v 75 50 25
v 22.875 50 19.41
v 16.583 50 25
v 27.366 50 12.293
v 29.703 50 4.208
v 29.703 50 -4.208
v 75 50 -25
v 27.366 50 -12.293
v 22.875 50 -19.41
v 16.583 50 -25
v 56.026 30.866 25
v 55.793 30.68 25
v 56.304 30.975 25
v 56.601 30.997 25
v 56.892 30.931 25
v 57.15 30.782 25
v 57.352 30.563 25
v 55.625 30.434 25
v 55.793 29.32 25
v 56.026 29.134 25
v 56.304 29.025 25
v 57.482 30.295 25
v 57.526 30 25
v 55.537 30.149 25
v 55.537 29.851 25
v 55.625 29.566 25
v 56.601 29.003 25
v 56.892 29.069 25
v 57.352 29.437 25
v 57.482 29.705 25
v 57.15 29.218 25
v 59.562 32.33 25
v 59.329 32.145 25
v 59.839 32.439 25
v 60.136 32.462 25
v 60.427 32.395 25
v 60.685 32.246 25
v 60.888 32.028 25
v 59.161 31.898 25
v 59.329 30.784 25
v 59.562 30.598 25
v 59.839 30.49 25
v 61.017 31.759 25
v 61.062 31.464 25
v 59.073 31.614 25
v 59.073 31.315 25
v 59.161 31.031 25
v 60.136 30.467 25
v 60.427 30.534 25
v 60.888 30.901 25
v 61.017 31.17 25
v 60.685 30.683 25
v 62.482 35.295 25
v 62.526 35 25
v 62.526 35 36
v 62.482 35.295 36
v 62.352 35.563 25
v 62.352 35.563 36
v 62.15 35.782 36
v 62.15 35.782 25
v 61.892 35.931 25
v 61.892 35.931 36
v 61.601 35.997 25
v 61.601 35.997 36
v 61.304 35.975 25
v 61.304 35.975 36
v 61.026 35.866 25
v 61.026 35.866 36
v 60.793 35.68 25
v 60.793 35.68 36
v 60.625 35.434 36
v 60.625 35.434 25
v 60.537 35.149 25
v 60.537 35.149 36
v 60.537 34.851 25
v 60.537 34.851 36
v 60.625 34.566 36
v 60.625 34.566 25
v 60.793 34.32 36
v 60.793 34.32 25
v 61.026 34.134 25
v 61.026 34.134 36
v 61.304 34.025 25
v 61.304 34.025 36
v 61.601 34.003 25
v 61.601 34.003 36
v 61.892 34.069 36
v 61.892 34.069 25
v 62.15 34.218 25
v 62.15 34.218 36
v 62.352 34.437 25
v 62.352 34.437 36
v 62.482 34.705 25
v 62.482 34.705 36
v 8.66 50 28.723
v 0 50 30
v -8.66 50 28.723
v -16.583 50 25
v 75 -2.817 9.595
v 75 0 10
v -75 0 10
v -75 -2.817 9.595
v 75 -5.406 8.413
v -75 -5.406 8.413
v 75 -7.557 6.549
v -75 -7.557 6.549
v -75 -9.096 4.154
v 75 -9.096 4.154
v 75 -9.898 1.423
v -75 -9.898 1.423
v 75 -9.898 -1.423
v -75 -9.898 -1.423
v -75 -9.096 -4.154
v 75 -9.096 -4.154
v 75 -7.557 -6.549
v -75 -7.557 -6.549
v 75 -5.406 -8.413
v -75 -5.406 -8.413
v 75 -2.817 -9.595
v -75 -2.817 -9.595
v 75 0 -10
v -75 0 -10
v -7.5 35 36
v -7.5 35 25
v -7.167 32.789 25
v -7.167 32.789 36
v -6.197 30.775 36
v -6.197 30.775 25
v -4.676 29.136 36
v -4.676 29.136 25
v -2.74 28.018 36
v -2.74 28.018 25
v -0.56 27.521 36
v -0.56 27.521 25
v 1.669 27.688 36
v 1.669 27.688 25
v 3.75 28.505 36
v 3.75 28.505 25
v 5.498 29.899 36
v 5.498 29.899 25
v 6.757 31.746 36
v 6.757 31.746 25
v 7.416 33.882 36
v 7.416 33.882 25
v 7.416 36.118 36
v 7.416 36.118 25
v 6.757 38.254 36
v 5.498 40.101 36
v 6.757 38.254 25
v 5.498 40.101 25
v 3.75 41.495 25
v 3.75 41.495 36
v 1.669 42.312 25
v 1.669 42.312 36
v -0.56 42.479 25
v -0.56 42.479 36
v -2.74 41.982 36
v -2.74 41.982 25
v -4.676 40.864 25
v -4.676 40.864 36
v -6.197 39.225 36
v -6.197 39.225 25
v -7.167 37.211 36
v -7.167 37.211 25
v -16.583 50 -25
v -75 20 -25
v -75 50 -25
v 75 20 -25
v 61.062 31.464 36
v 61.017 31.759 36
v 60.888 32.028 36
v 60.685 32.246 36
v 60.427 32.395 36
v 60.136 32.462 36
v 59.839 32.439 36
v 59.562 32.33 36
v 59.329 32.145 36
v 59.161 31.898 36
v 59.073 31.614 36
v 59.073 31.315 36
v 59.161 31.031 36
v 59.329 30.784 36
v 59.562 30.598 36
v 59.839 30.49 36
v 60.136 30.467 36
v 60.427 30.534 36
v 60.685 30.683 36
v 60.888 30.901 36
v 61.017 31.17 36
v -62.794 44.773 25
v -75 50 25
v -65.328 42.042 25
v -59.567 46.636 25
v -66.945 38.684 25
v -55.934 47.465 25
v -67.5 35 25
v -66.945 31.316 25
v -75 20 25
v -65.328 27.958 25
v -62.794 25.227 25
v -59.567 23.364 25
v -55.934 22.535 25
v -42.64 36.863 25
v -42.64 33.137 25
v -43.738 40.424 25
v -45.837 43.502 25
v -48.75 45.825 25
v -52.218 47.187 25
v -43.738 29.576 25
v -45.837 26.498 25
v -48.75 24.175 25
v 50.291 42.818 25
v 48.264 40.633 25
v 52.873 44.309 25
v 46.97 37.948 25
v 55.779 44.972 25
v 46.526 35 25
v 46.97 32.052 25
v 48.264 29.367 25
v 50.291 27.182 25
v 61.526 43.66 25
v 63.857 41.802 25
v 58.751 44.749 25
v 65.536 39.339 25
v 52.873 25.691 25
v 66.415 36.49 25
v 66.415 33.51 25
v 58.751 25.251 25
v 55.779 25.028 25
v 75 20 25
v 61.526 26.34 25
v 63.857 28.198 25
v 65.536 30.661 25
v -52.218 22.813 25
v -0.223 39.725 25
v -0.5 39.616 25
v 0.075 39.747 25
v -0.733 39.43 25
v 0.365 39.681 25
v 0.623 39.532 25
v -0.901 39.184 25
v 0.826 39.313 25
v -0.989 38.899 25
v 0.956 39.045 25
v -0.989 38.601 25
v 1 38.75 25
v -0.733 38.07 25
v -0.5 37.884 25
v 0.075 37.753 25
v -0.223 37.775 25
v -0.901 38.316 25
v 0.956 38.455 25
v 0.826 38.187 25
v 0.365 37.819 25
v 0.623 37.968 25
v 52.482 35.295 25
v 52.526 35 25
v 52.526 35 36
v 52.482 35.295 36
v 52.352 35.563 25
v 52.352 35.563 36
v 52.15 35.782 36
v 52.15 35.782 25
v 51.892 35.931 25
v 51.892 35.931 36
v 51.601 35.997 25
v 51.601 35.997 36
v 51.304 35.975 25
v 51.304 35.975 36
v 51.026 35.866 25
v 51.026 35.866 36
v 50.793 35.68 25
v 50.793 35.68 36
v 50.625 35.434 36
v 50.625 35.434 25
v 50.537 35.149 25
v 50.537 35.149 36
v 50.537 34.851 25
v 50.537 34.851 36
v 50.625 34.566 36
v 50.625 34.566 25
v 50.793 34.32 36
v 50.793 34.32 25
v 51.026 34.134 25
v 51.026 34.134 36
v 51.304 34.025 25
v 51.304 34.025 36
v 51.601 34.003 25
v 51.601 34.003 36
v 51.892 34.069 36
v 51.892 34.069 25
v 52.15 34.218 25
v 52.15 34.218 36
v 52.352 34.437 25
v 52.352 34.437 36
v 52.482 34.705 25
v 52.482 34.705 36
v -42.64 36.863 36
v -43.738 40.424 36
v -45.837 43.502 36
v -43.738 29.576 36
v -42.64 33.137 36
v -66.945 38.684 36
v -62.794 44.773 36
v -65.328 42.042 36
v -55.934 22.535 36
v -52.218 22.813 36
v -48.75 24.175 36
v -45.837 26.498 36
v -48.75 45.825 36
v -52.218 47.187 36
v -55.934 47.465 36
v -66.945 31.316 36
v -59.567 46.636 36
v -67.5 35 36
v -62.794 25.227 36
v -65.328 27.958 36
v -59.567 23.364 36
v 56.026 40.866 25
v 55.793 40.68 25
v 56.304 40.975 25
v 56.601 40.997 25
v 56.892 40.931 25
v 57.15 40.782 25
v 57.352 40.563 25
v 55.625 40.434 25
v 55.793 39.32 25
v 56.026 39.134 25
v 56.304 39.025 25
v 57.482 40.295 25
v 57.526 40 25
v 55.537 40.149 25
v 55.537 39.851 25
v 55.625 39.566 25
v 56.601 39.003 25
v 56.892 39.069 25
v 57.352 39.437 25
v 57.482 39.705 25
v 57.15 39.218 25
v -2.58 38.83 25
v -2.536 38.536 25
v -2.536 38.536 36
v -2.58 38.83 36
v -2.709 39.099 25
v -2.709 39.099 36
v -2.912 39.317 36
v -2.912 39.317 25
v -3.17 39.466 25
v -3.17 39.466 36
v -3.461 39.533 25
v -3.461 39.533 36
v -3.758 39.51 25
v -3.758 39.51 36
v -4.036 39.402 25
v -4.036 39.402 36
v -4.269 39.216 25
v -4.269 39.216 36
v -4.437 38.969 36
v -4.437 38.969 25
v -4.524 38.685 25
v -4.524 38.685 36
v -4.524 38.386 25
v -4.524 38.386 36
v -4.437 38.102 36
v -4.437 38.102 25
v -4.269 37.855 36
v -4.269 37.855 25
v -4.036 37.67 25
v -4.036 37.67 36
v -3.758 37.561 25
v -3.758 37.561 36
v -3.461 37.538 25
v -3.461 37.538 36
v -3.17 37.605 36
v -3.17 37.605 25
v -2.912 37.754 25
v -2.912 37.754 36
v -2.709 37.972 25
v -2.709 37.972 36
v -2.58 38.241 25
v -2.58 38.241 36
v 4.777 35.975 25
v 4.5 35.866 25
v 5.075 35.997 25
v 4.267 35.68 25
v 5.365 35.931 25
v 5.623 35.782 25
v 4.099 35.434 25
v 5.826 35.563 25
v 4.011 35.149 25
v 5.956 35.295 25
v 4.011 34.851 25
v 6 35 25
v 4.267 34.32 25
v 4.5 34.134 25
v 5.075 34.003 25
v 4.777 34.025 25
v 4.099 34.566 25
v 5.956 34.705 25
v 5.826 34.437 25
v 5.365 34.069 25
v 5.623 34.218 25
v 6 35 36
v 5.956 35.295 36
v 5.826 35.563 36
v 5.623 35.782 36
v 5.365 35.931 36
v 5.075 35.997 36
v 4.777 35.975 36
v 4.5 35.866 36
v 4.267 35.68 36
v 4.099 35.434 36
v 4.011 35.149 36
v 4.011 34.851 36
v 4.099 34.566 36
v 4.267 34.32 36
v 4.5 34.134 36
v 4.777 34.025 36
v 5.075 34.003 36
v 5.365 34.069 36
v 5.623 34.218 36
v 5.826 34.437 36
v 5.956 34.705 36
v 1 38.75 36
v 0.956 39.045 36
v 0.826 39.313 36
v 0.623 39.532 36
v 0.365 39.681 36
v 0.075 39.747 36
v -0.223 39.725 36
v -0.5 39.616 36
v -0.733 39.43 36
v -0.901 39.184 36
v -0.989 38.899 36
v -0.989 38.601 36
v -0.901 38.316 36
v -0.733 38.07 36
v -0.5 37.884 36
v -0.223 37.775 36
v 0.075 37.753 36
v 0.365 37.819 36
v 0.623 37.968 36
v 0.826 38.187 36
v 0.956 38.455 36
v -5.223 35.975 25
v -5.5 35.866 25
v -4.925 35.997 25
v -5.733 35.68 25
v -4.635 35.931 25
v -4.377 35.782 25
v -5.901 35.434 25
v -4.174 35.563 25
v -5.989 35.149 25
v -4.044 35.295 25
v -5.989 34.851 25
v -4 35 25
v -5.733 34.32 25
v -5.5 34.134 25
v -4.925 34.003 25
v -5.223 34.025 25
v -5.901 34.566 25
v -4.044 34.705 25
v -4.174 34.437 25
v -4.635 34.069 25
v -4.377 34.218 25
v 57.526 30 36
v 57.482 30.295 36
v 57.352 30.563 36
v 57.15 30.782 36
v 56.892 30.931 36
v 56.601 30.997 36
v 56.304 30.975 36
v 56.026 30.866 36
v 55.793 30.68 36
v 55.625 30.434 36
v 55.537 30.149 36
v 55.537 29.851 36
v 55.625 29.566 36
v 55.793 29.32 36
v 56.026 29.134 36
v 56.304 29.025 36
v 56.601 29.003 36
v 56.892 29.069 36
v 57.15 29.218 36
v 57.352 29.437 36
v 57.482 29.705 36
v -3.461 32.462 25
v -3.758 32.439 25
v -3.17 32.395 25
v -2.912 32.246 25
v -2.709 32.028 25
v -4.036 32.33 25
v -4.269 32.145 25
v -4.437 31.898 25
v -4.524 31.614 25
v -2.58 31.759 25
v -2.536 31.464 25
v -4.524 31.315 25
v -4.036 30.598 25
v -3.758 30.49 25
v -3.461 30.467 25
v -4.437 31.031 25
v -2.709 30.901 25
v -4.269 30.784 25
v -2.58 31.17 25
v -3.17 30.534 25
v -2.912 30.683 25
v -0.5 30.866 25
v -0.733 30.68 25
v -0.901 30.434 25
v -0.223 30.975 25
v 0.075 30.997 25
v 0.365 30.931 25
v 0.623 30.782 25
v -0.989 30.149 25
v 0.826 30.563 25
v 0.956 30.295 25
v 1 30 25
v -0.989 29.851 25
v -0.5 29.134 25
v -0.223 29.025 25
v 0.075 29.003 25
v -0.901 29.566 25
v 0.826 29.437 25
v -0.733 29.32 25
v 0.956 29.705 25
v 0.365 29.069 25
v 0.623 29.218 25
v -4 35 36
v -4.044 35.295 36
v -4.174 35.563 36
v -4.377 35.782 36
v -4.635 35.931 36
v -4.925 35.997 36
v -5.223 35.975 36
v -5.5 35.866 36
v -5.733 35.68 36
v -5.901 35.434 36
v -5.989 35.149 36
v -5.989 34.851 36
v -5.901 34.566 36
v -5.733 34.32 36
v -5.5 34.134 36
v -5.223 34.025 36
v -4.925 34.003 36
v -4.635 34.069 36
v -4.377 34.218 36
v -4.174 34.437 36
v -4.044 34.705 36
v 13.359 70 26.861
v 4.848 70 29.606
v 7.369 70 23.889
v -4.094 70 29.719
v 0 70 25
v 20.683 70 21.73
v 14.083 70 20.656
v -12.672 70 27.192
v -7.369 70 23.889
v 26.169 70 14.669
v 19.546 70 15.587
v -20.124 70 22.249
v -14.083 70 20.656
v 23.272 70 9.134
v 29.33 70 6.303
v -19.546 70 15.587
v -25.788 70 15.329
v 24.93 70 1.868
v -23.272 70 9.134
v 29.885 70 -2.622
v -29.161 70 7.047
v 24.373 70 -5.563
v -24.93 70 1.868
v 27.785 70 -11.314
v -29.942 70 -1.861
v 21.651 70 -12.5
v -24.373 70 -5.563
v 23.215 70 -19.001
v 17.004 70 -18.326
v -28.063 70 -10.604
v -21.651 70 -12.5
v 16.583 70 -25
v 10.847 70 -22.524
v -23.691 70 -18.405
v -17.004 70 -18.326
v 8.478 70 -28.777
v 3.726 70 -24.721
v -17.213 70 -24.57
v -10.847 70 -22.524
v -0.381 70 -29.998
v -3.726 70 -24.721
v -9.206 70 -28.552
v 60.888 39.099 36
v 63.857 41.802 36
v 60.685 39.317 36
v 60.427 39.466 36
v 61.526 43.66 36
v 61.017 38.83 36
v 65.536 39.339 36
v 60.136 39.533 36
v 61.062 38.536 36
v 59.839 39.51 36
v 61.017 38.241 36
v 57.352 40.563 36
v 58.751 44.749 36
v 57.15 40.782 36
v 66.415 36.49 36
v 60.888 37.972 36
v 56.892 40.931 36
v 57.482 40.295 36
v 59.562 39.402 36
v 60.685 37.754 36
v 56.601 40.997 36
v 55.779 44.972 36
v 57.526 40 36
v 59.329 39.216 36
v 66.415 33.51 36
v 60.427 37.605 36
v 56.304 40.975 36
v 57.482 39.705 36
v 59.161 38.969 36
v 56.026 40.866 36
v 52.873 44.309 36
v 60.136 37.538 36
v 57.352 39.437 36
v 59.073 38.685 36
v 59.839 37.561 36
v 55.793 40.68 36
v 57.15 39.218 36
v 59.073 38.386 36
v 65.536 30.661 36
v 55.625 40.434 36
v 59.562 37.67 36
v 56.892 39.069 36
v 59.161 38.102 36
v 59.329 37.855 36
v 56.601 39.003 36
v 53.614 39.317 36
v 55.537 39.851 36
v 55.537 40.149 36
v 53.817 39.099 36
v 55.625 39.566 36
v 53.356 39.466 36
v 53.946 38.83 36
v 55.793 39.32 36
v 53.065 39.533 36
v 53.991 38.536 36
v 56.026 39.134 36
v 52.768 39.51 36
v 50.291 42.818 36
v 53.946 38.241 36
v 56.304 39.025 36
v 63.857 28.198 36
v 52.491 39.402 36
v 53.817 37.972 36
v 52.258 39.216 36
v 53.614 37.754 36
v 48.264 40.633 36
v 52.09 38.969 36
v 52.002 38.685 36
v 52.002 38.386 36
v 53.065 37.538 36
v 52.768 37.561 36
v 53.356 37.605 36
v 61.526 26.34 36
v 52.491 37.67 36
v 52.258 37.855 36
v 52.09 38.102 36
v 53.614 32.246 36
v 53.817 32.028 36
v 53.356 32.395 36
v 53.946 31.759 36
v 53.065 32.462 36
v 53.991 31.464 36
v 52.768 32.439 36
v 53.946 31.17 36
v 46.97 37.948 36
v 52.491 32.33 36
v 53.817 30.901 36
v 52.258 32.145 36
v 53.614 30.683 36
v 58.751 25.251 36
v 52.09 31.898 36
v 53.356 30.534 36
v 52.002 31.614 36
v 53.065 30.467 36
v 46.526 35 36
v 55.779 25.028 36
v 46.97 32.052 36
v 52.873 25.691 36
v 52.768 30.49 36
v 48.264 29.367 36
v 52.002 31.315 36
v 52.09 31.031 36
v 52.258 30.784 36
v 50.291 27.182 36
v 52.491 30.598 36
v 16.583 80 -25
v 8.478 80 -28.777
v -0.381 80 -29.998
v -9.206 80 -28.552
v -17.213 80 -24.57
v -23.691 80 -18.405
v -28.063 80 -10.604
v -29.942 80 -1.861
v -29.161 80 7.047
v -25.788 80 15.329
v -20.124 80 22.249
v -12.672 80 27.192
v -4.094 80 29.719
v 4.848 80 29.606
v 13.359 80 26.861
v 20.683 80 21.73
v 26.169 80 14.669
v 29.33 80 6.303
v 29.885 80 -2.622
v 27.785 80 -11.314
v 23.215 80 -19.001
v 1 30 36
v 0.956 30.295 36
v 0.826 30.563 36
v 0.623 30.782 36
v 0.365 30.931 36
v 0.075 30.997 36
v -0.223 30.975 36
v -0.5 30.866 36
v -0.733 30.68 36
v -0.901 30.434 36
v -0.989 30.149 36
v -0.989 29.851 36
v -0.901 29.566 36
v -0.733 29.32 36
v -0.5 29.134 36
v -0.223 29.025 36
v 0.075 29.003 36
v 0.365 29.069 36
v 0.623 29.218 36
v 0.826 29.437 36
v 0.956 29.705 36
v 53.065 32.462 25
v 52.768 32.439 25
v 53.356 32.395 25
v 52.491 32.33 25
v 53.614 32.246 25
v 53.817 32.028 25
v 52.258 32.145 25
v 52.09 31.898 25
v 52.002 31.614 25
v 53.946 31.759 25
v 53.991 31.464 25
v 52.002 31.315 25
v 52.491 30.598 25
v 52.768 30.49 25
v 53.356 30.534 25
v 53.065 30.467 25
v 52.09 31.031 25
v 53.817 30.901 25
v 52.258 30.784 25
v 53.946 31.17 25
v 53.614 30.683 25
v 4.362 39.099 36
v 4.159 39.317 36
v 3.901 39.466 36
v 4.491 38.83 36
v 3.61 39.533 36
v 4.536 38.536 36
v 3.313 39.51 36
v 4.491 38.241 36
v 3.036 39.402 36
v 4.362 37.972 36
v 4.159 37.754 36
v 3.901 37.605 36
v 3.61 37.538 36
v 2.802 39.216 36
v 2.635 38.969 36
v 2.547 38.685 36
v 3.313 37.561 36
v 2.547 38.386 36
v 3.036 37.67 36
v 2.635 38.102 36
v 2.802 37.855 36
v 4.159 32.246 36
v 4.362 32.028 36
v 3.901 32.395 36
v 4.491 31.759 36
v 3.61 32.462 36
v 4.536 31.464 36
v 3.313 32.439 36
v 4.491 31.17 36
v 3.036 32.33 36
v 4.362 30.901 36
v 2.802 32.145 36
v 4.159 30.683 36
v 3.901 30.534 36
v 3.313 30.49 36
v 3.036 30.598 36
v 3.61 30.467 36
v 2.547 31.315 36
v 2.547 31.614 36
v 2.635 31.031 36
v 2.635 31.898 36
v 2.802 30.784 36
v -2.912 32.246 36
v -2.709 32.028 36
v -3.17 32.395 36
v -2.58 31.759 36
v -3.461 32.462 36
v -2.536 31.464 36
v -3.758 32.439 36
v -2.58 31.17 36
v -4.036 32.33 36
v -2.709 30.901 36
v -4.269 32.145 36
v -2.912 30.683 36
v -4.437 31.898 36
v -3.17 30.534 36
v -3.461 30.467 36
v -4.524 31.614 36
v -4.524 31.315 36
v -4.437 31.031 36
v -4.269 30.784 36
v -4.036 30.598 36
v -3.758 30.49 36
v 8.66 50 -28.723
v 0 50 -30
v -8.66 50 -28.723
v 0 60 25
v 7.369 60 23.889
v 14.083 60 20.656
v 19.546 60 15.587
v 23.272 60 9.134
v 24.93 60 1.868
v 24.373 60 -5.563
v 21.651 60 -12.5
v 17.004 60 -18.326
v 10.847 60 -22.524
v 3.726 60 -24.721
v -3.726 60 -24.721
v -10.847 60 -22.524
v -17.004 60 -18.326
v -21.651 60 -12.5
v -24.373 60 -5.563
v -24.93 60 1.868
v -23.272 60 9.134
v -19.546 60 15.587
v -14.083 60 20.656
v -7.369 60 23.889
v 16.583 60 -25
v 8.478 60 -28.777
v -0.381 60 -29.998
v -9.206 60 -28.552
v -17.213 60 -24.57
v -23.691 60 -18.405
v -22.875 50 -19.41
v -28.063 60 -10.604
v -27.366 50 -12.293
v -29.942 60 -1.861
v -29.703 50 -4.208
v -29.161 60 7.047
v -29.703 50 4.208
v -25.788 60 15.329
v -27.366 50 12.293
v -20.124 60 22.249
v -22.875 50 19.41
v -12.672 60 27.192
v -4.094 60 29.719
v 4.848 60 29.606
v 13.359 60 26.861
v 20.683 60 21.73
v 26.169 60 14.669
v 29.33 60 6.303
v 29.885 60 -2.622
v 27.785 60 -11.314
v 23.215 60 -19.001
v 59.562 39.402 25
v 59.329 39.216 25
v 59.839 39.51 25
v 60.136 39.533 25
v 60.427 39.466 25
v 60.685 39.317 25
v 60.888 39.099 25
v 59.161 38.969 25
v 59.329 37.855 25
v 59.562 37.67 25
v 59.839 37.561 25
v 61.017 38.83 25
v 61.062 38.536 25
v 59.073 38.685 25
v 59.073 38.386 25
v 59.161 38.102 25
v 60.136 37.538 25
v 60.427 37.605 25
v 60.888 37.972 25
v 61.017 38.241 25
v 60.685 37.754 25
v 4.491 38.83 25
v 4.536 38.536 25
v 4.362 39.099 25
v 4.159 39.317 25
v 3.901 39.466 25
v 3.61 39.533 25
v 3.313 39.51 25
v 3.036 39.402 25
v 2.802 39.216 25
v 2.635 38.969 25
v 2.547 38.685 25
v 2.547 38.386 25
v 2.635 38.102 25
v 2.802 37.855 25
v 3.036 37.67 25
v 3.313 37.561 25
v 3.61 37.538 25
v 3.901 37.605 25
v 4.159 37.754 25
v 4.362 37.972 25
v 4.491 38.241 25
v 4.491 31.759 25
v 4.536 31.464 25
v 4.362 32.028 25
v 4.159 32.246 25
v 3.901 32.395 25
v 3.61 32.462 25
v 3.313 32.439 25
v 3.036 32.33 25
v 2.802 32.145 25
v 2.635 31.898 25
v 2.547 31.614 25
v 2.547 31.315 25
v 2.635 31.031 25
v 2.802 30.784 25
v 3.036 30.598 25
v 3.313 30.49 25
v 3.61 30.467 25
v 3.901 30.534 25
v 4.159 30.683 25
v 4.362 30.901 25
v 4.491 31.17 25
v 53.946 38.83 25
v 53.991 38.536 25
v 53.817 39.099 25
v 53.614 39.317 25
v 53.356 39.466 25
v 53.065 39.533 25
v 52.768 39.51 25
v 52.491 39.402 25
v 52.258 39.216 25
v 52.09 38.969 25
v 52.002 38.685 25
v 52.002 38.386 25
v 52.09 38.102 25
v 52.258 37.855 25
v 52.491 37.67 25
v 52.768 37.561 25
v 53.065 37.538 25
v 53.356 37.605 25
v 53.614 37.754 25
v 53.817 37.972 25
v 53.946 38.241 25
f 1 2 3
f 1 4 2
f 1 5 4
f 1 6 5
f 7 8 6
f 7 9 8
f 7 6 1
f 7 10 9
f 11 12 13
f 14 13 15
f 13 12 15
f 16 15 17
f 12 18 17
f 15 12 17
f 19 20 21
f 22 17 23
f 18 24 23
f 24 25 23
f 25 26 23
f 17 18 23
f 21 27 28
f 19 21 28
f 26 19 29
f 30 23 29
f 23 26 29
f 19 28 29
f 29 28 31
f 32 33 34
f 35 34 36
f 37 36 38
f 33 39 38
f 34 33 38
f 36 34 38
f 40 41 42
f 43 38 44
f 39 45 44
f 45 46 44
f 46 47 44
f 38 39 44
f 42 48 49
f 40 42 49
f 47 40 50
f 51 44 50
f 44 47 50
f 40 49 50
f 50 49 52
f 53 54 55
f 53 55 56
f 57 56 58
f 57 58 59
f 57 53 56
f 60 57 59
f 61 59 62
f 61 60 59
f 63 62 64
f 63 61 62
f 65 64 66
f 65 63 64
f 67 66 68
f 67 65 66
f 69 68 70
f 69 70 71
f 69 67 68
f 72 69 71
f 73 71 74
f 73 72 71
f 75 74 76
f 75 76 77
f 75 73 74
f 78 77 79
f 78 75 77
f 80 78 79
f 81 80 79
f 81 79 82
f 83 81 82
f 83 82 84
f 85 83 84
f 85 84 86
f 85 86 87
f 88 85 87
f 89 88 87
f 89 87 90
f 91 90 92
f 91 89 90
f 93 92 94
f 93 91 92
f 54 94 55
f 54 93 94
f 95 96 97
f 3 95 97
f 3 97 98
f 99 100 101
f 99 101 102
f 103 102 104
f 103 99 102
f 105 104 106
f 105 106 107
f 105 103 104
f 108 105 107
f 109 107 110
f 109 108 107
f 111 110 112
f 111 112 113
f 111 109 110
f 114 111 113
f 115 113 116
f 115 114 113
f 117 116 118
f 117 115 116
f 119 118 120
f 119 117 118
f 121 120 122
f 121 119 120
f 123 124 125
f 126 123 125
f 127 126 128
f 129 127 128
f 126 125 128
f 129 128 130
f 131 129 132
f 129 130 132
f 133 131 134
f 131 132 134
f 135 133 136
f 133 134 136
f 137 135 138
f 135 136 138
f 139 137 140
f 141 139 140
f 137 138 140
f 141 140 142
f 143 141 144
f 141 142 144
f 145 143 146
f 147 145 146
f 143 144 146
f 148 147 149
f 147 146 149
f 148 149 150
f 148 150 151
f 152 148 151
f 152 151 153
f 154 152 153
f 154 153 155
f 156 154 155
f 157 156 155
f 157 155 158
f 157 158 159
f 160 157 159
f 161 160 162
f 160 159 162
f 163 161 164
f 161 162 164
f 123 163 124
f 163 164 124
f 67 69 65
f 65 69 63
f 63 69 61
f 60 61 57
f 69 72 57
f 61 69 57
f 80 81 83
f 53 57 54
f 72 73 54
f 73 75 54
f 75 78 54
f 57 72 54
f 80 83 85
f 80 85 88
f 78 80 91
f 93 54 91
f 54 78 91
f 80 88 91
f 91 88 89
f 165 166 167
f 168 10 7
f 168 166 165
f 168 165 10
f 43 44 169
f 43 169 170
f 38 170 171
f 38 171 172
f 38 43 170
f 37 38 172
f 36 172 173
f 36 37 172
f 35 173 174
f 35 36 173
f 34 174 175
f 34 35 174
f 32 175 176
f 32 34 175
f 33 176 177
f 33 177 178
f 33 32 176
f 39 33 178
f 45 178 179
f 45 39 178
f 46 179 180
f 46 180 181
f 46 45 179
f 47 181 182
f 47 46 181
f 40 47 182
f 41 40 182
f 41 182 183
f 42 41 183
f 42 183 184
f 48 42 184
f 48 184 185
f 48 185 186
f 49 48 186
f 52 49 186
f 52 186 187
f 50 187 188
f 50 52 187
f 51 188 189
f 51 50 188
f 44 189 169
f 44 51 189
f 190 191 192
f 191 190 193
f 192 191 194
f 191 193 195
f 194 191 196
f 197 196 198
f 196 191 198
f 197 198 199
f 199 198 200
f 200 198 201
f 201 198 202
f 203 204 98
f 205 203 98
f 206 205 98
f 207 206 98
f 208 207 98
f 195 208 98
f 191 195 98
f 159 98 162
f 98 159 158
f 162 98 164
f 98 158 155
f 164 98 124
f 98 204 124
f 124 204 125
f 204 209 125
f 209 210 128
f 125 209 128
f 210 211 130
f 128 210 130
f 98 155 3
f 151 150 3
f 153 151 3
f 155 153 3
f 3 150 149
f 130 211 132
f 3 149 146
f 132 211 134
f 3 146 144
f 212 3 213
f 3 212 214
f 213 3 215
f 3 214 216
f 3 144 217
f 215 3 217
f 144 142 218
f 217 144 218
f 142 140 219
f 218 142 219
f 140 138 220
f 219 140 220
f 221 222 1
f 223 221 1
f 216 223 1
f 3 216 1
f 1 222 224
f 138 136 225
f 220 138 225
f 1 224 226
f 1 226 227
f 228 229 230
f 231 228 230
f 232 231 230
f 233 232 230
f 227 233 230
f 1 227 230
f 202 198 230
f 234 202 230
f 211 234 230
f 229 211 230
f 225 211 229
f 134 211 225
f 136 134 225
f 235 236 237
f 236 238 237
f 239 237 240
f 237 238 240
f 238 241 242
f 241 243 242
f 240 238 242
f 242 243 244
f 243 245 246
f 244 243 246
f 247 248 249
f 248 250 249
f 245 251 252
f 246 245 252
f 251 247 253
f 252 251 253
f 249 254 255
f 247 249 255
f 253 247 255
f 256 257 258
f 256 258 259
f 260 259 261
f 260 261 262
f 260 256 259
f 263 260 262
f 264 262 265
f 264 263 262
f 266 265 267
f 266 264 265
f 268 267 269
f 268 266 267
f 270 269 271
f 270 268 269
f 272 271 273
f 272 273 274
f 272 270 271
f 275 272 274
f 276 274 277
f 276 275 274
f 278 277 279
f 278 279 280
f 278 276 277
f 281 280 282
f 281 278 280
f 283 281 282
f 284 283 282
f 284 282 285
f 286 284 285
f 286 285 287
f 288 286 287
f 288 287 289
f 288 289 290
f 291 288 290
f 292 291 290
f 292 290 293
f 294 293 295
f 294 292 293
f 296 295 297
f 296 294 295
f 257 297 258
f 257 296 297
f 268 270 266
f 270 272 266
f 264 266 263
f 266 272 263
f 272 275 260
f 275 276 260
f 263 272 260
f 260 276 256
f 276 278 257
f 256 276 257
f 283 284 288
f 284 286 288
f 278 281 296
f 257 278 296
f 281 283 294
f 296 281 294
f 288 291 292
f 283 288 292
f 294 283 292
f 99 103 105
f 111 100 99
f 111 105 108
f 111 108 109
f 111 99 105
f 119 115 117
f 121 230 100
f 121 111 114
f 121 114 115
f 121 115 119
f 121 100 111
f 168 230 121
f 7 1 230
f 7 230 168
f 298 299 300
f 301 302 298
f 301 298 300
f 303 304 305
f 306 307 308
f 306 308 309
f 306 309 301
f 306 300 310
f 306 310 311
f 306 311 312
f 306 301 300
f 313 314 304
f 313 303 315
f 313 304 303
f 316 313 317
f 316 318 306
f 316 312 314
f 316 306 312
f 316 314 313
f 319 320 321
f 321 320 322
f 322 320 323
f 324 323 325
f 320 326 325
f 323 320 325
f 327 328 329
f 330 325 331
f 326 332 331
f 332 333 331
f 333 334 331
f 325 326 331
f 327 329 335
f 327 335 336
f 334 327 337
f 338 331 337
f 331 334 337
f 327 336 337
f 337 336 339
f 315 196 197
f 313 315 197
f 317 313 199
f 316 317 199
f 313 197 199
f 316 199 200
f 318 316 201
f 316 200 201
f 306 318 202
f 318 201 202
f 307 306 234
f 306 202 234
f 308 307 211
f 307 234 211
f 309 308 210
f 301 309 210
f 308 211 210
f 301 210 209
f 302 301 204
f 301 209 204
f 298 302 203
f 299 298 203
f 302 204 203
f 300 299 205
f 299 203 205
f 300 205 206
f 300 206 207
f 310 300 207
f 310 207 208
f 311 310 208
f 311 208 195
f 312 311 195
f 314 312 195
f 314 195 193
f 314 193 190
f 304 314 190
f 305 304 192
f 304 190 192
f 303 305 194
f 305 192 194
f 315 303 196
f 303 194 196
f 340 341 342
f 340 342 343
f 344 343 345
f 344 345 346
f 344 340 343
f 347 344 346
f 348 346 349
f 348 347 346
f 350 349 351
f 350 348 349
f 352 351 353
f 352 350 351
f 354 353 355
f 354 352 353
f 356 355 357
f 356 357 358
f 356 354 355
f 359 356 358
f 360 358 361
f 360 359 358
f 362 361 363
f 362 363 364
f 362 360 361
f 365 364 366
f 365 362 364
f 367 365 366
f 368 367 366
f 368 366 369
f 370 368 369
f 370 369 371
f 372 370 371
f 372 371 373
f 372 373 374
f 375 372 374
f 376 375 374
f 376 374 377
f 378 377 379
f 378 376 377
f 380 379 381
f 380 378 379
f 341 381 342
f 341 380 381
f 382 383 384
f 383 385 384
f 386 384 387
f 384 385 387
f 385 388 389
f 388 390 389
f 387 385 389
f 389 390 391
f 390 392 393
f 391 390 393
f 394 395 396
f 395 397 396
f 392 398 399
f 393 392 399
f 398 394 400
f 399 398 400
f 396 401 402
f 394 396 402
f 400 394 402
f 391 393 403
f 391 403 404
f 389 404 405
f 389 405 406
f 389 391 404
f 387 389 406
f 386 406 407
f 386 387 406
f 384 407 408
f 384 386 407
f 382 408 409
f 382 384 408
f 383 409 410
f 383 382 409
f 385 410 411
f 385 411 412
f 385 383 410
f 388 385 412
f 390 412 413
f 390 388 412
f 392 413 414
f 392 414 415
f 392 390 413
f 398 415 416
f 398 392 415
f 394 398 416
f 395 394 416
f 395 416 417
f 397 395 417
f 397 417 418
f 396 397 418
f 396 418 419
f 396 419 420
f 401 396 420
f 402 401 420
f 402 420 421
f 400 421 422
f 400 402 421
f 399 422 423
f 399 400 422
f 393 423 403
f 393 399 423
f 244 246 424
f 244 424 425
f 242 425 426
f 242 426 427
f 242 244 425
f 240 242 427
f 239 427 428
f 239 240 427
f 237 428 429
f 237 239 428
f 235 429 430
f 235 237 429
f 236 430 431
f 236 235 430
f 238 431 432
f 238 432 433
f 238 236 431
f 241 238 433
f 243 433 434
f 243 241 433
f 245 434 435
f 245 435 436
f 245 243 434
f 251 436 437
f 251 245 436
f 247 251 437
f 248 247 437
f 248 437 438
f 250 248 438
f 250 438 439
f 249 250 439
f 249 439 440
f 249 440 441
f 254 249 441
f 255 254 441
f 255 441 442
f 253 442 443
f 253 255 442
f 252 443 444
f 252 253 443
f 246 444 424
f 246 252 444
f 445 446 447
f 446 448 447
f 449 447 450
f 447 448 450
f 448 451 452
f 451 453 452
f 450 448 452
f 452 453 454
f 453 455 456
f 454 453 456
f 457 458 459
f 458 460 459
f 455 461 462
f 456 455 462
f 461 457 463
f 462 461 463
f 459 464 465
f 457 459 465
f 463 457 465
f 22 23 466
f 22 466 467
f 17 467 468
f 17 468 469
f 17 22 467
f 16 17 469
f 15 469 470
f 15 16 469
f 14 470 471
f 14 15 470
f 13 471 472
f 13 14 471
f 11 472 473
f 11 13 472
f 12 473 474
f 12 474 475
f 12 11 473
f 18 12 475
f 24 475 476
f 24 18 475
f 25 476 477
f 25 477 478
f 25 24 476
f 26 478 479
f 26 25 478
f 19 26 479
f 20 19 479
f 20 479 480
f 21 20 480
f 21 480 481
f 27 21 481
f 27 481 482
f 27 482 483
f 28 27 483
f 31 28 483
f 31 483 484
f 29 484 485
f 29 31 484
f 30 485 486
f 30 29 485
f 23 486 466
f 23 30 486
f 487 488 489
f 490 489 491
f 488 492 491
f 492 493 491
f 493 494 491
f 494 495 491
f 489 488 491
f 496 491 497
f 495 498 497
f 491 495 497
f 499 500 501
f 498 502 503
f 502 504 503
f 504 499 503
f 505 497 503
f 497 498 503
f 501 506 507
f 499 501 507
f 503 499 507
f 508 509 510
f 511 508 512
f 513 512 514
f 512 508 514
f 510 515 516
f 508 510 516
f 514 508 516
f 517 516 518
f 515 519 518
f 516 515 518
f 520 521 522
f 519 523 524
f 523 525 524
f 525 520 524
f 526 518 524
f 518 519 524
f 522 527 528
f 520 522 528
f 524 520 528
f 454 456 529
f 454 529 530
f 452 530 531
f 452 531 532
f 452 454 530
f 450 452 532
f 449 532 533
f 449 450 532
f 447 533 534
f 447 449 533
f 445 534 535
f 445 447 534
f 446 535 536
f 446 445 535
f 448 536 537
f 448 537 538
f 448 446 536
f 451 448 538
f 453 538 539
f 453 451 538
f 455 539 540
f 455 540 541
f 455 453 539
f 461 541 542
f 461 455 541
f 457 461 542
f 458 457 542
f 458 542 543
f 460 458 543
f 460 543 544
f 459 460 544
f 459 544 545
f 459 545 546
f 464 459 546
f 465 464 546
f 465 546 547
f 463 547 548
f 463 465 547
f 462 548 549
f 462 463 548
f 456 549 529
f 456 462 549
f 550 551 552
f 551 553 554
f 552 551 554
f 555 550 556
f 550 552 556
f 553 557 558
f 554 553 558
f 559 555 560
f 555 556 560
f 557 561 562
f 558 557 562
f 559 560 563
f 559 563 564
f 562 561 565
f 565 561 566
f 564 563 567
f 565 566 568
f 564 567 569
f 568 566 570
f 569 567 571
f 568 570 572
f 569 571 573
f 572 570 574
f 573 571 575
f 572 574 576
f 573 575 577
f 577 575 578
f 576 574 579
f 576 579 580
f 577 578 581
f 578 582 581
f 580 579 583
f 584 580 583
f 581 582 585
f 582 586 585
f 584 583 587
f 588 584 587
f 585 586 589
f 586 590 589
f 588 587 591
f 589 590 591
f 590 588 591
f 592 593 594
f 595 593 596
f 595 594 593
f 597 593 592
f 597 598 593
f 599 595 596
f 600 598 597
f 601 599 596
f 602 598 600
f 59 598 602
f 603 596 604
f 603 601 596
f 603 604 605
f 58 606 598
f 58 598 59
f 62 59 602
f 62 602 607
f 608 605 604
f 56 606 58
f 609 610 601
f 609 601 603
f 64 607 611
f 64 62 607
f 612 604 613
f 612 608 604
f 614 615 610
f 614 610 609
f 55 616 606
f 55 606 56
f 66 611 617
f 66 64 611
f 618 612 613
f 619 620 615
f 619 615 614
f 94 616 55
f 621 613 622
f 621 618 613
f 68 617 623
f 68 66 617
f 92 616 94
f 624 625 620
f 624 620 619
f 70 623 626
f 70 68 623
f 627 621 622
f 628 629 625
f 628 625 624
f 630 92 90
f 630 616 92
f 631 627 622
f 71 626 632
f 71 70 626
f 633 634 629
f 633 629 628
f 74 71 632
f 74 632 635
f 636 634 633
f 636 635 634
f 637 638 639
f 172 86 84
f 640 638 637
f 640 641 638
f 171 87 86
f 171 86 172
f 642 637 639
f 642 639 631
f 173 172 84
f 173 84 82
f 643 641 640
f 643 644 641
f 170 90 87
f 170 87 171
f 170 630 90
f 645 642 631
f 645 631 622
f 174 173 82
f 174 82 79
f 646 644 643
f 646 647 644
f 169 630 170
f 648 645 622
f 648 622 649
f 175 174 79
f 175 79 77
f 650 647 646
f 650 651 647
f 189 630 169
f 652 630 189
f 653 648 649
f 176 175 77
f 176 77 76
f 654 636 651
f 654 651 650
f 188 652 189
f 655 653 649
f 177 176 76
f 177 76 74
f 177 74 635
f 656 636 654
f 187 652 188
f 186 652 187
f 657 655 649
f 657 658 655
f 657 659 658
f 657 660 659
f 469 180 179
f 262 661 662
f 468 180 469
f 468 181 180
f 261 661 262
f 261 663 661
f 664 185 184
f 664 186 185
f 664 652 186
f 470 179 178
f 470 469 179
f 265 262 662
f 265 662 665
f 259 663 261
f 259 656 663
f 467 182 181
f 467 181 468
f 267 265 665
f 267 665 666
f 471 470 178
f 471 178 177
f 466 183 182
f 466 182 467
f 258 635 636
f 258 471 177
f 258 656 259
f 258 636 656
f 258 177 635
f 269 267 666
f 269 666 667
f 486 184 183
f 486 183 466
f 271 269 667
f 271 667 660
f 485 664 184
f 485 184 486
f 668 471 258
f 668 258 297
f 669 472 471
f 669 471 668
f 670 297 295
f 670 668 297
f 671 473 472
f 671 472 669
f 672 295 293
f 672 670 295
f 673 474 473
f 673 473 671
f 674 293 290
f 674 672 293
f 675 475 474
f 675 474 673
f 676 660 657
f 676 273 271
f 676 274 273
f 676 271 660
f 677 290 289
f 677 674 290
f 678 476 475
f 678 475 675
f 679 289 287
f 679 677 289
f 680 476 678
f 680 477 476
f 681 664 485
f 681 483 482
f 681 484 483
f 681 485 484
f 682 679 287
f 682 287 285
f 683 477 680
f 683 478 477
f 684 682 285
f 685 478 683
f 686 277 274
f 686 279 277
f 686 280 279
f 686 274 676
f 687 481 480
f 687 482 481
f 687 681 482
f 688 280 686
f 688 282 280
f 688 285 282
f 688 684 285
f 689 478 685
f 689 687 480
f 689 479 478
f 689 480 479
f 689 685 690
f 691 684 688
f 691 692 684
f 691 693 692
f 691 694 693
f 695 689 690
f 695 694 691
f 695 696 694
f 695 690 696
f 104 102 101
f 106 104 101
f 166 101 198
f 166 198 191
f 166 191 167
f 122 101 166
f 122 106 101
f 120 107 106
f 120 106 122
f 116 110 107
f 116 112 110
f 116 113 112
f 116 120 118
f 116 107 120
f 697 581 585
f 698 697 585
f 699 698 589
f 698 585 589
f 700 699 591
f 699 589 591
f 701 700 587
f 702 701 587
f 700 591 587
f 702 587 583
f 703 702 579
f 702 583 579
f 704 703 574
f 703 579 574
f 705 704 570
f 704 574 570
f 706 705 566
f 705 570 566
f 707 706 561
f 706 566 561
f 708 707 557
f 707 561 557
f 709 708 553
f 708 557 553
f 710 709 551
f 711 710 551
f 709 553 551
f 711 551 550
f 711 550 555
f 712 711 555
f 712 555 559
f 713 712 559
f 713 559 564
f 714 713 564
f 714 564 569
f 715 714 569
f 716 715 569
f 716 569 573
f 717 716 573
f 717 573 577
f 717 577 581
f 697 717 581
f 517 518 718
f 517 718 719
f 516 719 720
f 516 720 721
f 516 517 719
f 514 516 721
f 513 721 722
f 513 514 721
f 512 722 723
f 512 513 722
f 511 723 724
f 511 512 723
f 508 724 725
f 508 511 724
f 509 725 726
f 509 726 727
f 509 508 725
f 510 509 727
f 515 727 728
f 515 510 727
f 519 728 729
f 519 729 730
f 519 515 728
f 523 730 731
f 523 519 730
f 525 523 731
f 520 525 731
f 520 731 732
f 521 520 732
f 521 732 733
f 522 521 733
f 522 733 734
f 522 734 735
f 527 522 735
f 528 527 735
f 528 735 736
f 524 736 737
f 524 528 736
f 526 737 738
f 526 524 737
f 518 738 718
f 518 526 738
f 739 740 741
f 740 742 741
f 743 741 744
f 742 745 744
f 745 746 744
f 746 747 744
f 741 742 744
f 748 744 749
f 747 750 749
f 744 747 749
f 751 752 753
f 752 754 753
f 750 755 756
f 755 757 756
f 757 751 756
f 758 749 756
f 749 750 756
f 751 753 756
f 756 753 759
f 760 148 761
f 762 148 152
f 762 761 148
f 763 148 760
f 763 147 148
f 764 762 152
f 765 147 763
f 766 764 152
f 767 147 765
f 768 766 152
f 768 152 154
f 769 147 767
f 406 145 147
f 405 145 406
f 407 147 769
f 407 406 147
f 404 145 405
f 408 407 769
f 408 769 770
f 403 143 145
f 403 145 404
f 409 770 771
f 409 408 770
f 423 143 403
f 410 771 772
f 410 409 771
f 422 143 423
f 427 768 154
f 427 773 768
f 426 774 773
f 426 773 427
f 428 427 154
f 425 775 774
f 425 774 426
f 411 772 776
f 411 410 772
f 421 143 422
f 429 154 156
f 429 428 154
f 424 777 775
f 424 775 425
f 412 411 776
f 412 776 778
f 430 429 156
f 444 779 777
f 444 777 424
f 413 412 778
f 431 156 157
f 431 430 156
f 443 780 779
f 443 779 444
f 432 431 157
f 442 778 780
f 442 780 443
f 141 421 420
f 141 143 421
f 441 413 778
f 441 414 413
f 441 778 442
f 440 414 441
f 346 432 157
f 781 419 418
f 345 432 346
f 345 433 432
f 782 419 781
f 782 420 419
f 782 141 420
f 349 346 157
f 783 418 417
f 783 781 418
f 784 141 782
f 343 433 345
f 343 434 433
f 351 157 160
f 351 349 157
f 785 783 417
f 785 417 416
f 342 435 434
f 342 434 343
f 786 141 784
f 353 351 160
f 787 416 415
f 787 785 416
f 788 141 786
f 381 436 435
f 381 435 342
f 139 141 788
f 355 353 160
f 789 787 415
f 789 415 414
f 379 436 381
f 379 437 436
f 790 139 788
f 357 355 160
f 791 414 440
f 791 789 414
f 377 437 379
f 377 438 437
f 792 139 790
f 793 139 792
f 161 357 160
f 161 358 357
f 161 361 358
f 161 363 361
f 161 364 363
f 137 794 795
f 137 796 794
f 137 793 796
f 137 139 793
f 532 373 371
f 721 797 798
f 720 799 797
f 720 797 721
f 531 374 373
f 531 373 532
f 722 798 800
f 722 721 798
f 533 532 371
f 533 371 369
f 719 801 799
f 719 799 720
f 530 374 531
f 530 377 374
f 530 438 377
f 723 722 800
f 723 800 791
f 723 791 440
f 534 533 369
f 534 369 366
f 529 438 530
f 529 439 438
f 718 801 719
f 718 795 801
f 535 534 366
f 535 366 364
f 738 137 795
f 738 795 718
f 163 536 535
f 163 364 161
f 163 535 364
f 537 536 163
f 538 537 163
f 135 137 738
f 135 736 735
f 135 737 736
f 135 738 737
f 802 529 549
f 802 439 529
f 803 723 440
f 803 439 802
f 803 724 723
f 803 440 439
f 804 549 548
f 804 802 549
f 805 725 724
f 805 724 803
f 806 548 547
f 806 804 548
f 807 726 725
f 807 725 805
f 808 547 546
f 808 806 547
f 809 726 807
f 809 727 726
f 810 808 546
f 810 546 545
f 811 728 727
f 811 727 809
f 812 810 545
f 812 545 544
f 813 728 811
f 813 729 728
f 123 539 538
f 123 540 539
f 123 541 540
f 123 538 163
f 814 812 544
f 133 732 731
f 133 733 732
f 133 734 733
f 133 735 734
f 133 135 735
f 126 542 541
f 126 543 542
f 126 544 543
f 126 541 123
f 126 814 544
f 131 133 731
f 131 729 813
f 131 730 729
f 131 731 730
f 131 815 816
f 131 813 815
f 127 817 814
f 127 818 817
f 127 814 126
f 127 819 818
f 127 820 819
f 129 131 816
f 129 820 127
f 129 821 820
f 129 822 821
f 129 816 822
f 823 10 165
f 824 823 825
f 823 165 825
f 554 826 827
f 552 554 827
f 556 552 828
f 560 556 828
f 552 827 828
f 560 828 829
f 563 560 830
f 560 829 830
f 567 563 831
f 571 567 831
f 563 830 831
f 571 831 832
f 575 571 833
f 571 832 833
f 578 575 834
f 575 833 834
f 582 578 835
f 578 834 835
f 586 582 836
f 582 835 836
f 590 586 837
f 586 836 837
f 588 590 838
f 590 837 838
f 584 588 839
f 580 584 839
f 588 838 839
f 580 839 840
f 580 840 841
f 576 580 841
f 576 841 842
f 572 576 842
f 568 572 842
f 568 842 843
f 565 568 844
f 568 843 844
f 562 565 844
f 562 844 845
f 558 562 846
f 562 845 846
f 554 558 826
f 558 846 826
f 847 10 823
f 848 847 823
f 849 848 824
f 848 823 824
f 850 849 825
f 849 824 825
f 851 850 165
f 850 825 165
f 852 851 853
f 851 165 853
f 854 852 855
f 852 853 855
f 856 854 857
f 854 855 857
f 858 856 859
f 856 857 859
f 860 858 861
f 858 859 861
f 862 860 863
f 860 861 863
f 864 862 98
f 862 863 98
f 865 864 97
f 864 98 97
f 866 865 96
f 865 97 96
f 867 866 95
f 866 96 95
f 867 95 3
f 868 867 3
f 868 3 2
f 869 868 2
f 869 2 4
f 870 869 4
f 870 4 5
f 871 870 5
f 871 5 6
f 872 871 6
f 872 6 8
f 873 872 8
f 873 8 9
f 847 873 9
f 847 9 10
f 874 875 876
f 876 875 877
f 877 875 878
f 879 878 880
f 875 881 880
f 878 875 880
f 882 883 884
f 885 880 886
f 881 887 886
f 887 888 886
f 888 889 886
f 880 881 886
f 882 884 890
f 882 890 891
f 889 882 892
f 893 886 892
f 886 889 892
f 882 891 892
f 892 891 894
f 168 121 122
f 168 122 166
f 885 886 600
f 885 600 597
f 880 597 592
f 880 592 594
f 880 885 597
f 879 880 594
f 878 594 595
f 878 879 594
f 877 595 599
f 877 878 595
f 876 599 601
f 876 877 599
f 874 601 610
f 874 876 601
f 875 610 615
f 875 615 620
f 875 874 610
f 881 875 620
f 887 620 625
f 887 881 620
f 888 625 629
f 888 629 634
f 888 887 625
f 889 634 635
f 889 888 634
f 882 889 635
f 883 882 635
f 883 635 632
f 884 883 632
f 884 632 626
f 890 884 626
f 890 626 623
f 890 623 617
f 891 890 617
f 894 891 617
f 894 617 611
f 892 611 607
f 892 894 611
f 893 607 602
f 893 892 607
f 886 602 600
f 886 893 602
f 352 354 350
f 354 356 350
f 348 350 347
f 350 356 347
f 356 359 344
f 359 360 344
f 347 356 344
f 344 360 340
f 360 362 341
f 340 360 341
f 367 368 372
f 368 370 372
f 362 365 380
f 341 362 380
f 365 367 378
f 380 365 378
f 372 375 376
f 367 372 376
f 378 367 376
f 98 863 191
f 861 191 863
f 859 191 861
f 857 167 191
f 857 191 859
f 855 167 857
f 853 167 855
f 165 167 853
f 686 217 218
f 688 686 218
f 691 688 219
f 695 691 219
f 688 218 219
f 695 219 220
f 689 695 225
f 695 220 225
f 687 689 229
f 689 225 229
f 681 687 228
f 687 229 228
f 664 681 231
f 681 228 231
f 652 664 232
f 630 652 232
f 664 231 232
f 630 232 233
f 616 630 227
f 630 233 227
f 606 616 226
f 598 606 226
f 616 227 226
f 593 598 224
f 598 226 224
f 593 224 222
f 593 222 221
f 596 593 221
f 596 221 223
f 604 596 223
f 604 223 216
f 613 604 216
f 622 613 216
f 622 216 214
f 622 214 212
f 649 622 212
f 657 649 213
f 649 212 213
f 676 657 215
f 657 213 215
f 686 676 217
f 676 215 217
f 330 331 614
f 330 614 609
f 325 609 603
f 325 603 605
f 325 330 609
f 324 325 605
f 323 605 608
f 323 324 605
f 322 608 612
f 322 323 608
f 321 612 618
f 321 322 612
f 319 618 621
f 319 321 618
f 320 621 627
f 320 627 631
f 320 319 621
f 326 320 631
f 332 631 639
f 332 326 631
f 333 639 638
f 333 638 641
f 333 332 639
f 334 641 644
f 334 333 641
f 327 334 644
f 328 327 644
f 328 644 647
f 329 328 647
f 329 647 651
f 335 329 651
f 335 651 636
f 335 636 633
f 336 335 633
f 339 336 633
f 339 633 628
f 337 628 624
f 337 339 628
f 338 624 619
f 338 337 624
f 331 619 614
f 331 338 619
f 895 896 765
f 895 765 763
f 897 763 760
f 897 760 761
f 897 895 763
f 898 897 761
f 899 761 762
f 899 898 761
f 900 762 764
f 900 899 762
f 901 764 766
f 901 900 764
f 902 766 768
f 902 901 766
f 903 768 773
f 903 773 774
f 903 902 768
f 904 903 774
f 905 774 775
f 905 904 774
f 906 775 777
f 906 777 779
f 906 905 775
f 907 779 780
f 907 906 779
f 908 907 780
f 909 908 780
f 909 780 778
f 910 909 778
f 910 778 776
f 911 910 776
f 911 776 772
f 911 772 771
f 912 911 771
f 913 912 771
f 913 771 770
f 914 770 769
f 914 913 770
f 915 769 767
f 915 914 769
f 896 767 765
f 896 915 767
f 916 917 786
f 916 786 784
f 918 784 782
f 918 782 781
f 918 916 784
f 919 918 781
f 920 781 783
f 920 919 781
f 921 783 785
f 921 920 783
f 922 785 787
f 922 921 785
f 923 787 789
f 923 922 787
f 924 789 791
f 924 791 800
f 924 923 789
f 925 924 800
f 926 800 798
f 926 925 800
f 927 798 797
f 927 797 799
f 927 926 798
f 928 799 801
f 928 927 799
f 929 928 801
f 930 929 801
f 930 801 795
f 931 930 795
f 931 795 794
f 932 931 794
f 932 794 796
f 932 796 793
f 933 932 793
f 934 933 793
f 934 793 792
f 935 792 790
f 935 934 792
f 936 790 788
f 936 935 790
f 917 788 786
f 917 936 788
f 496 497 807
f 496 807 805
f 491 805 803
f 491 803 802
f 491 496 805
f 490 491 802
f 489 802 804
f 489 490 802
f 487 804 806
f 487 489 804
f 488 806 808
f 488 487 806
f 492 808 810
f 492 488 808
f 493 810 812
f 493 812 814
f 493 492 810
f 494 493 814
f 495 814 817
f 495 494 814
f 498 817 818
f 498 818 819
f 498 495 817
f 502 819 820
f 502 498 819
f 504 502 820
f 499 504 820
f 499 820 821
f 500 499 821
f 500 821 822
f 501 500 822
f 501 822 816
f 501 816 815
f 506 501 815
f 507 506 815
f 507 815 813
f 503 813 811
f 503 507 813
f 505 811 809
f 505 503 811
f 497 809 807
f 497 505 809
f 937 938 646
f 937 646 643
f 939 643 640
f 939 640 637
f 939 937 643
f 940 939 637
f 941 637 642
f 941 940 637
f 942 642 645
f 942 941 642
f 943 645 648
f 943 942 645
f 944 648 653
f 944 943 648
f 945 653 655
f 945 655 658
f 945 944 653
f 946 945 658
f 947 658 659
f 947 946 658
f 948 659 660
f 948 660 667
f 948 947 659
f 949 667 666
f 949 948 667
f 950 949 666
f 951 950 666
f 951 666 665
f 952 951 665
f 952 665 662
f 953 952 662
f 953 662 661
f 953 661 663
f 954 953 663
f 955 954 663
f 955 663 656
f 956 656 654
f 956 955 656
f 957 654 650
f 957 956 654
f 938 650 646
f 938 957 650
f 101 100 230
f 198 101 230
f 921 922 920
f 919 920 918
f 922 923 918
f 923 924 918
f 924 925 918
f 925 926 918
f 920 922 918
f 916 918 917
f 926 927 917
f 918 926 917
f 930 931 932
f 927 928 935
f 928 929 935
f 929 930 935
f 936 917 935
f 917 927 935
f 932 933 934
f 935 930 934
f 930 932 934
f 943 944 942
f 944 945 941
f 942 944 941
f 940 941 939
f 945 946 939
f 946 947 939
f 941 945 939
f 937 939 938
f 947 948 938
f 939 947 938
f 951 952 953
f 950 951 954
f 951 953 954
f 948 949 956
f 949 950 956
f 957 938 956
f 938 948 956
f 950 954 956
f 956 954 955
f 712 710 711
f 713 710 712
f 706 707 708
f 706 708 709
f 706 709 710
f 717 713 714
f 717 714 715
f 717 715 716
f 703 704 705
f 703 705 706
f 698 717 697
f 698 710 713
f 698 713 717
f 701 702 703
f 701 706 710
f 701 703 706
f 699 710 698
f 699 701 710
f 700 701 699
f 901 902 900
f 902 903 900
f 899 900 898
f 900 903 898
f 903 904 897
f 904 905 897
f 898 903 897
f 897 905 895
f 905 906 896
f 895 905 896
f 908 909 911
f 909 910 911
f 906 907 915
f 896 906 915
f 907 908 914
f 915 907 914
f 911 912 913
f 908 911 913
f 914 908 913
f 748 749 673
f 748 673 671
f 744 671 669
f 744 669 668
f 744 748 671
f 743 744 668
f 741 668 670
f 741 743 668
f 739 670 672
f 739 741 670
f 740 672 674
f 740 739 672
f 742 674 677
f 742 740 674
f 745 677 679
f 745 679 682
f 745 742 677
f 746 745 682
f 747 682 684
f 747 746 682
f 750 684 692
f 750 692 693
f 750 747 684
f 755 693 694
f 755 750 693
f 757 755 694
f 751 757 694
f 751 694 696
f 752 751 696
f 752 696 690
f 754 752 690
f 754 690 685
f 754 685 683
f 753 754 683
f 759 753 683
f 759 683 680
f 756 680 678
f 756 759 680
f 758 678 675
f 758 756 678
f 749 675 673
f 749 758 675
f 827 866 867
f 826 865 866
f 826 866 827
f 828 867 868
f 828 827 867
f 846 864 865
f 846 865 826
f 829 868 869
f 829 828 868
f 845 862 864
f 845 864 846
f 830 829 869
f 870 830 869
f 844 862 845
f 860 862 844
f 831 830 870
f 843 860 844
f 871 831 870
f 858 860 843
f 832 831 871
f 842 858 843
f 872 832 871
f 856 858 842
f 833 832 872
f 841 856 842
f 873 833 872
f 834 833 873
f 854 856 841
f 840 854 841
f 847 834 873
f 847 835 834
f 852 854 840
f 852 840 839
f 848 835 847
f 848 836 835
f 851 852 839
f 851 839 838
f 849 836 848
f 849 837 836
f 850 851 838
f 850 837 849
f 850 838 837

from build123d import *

# Parameters (mm, degrees)
SKIZZE1_W                       = 150
SKIZZE1_H                       = 50
AUFSATZ_LINEAR_AUSTRAGEN1_DEPTH = 50
SKIZZE2_R                       = 10
AUFSATZ_LINEAR_AUSTRAGEN2_DEPTH = 150
SCHNITT_LINEAR_AUSTRAGEN1_DEPTH = 182
SKIZZE4_R                       = 12.5
SKIZZE4_R_2                     = 10
SKIZZE4_R_3                     = 1
SKIZZE4_R_4                     = 7.5
AUFSATZ_LINEAR_AUSTRAGEN3_DEPTH = 11
SKIZZE5_R                       = 30
AUFSATZ_LINEAR_AUSTRAGEN4_DEPTH = 30
SCHNITT_LINEAR_START            = -20
SKIZZE6_R                       = 30
SKIZZE6_R_2                     = 25
SCHNITT_LINEAR_AUSTRAGEN3_DEPTH = 10


with BuildPart() as part:
    # Skizze1 → Aufsatz-Linear austragen1 (new body)
    with BuildSketch(Plane(origin=(0, 0, 0), x_dir=(1, 0, 0), z_dir=(0, 1, 0))):
        Rectangle(SKIZZE1_W, SKIZZE1_H)
    extrude(amount=AUFSATZ_LINEAR_AUSTRAGEN1_DEPTH)

    # Skizze2 → Aufsatz-Linear austragen2 (add)
    with BuildSketch(Plane(origin=(75, 0, 0), x_dir=(0, 0, -1), z_dir=(1, 0, 0))):
        Circle(SKIZZE2_R)
    extrude(amount=-AUFSATZ_LINEAR_AUSTRAGEN2_DEPTH)

    # Skizze3 → Schnitt-Linear austragen1 (cut)
    with BuildSketch(Plane(origin=(75, 0, 0), x_dir=(0, 0, -1), z_dir=(1, 0, 0))):
        Polygon((-10, 0), (-25, 20), (-25, 0), align=None)
        Polygon((25, 20), (25, 0), (10, 0), align=None)
    extrude(amount=-SCHNITT_LINEAR_AUSTRAGEN1_DEPTH, mode=Mode.SUBTRACT)

    # Skizze4 → Aufsatz-Linear austragen3 (add)
    # profile 1 of 3: a face of its own
    with BuildSketch(Plane.XY.offset(25)):
        with Locations(Location((-55, 35, 0), (0, 0, 180))):
            Circle(SKIZZE4_R)
    # profile 2 of 3: a face of its own
    with BuildSketch(Plane.XY.offset(25)):
        with Locations(Location((56.52620572, 35, 0), (0, 0, 180))):
            Circle(SKIZZE4_R_2)
        with Locations((56.52620572, 40)):
            Circle(SKIZZE4_R_3, mode=Mode.SUBTRACT)
        with Locations((60.061739626, 38.535533906)):
            Circle(SKIZZE4_R_3, mode=Mode.SUBTRACT)
        with Locations((61.52620572, 35)):
            Circle(SKIZZE4_R_3, mode=Mode.SUBTRACT)
        with Locations((60.061739626, 31.464466094)):
            Circle(SKIZZE4_R_3, mode=Mode.SUBTRACT)
        with Locations((56.52620572, 30)):
            Circle(SKIZZE4_R_3, mode=Mode.SUBTRACT)
        with Locations((52.990671814, 31.464466094)):
            Circle(SKIZZE4_R_3, mode=Mode.SUBTRACT)
        with Locations((51.52620572, 35)):
            Circle(SKIZZE4_R_3, mode=Mode.SUBTRACT)
        with Locations((52.990671814, 38.535533906)):
            Circle(SKIZZE4_R_3, mode=Mode.SUBTRACT)
    # profile 3 of 3: a face of its own
    with BuildSketch(Plane.XY.offset(25)):
        with Locations(Location((0, 35, 0), (0, 0, 180))):
            Circle(SKIZZE4_R_4)
        with Locations((0, 38.75)):
            Circle(SKIZZE4_R_3, mode=Mode.SUBTRACT)
        with Locations((3.535533906, 38.535533906)):
            Circle(SKIZZE4_R_3, mode=Mode.SUBTRACT)
        with Locations((5, 35)):
            Circle(SKIZZE4_R_3, mode=Mode.SUBTRACT)
        with Locations((3.535533906, 31.464466094)):
            Circle(SKIZZE4_R_3, mode=Mode.SUBTRACT)
        with Locations((0, 30)):
            Circle(SKIZZE4_R_3, mode=Mode.SUBTRACT)
        with Locations((-3.535533906, 31.464466094)):
            Circle(SKIZZE4_R_3, mode=Mode.SUBTRACT)
        with Locations((-5, 35)):
            Circle(SKIZZE4_R_3, mode=Mode.SUBTRACT)
        with Locations((-3.535533906, 38.535533906)):
            Circle(SKIZZE4_R_3, mode=Mode.SUBTRACT)
    extrude(amount=AUFSATZ_LINEAR_AUSTRAGEN3_DEPTH)

    # Skizze5 → Aufsatz-Linear austragen4 (add)
    with BuildSketch(Plane(origin=(0, 50, 0), x_dir=(1, 0, 0), z_dir=(0, 1, 0))):
        with Locations(Location((0, 0, 0), (0, 0, 56.442690238))):
            Circle(SKIZZE5_R)
    extrude(amount=AUFSATZ_LINEAR_AUSTRAGEN4_DEPTH)

    # Skizze6 → Schnitt-Linear austragen3 (cut)
    with BuildSketch(Plane(origin=(0, 80, 0), x_dir=(1, 0, 0), z_dir=(0, 1, 0)).offset(SCHNITT_LINEAR_START)):
        with Locations(Location((0, 0, 0), (0, 0, 56.442690238))):
            Circle(SKIZZE6_R)
        with Locations(Location((0, 0, 0), (0, 0, 270))):
            Circle(SKIZZE6_R_2, mode=Mode.SUBTRACT)
    extrude(amount=SCHNITT_LINEAR_AUSTRAGEN3_DEPTH, mode=Mode.SUBTRACT)


solid = part.part
